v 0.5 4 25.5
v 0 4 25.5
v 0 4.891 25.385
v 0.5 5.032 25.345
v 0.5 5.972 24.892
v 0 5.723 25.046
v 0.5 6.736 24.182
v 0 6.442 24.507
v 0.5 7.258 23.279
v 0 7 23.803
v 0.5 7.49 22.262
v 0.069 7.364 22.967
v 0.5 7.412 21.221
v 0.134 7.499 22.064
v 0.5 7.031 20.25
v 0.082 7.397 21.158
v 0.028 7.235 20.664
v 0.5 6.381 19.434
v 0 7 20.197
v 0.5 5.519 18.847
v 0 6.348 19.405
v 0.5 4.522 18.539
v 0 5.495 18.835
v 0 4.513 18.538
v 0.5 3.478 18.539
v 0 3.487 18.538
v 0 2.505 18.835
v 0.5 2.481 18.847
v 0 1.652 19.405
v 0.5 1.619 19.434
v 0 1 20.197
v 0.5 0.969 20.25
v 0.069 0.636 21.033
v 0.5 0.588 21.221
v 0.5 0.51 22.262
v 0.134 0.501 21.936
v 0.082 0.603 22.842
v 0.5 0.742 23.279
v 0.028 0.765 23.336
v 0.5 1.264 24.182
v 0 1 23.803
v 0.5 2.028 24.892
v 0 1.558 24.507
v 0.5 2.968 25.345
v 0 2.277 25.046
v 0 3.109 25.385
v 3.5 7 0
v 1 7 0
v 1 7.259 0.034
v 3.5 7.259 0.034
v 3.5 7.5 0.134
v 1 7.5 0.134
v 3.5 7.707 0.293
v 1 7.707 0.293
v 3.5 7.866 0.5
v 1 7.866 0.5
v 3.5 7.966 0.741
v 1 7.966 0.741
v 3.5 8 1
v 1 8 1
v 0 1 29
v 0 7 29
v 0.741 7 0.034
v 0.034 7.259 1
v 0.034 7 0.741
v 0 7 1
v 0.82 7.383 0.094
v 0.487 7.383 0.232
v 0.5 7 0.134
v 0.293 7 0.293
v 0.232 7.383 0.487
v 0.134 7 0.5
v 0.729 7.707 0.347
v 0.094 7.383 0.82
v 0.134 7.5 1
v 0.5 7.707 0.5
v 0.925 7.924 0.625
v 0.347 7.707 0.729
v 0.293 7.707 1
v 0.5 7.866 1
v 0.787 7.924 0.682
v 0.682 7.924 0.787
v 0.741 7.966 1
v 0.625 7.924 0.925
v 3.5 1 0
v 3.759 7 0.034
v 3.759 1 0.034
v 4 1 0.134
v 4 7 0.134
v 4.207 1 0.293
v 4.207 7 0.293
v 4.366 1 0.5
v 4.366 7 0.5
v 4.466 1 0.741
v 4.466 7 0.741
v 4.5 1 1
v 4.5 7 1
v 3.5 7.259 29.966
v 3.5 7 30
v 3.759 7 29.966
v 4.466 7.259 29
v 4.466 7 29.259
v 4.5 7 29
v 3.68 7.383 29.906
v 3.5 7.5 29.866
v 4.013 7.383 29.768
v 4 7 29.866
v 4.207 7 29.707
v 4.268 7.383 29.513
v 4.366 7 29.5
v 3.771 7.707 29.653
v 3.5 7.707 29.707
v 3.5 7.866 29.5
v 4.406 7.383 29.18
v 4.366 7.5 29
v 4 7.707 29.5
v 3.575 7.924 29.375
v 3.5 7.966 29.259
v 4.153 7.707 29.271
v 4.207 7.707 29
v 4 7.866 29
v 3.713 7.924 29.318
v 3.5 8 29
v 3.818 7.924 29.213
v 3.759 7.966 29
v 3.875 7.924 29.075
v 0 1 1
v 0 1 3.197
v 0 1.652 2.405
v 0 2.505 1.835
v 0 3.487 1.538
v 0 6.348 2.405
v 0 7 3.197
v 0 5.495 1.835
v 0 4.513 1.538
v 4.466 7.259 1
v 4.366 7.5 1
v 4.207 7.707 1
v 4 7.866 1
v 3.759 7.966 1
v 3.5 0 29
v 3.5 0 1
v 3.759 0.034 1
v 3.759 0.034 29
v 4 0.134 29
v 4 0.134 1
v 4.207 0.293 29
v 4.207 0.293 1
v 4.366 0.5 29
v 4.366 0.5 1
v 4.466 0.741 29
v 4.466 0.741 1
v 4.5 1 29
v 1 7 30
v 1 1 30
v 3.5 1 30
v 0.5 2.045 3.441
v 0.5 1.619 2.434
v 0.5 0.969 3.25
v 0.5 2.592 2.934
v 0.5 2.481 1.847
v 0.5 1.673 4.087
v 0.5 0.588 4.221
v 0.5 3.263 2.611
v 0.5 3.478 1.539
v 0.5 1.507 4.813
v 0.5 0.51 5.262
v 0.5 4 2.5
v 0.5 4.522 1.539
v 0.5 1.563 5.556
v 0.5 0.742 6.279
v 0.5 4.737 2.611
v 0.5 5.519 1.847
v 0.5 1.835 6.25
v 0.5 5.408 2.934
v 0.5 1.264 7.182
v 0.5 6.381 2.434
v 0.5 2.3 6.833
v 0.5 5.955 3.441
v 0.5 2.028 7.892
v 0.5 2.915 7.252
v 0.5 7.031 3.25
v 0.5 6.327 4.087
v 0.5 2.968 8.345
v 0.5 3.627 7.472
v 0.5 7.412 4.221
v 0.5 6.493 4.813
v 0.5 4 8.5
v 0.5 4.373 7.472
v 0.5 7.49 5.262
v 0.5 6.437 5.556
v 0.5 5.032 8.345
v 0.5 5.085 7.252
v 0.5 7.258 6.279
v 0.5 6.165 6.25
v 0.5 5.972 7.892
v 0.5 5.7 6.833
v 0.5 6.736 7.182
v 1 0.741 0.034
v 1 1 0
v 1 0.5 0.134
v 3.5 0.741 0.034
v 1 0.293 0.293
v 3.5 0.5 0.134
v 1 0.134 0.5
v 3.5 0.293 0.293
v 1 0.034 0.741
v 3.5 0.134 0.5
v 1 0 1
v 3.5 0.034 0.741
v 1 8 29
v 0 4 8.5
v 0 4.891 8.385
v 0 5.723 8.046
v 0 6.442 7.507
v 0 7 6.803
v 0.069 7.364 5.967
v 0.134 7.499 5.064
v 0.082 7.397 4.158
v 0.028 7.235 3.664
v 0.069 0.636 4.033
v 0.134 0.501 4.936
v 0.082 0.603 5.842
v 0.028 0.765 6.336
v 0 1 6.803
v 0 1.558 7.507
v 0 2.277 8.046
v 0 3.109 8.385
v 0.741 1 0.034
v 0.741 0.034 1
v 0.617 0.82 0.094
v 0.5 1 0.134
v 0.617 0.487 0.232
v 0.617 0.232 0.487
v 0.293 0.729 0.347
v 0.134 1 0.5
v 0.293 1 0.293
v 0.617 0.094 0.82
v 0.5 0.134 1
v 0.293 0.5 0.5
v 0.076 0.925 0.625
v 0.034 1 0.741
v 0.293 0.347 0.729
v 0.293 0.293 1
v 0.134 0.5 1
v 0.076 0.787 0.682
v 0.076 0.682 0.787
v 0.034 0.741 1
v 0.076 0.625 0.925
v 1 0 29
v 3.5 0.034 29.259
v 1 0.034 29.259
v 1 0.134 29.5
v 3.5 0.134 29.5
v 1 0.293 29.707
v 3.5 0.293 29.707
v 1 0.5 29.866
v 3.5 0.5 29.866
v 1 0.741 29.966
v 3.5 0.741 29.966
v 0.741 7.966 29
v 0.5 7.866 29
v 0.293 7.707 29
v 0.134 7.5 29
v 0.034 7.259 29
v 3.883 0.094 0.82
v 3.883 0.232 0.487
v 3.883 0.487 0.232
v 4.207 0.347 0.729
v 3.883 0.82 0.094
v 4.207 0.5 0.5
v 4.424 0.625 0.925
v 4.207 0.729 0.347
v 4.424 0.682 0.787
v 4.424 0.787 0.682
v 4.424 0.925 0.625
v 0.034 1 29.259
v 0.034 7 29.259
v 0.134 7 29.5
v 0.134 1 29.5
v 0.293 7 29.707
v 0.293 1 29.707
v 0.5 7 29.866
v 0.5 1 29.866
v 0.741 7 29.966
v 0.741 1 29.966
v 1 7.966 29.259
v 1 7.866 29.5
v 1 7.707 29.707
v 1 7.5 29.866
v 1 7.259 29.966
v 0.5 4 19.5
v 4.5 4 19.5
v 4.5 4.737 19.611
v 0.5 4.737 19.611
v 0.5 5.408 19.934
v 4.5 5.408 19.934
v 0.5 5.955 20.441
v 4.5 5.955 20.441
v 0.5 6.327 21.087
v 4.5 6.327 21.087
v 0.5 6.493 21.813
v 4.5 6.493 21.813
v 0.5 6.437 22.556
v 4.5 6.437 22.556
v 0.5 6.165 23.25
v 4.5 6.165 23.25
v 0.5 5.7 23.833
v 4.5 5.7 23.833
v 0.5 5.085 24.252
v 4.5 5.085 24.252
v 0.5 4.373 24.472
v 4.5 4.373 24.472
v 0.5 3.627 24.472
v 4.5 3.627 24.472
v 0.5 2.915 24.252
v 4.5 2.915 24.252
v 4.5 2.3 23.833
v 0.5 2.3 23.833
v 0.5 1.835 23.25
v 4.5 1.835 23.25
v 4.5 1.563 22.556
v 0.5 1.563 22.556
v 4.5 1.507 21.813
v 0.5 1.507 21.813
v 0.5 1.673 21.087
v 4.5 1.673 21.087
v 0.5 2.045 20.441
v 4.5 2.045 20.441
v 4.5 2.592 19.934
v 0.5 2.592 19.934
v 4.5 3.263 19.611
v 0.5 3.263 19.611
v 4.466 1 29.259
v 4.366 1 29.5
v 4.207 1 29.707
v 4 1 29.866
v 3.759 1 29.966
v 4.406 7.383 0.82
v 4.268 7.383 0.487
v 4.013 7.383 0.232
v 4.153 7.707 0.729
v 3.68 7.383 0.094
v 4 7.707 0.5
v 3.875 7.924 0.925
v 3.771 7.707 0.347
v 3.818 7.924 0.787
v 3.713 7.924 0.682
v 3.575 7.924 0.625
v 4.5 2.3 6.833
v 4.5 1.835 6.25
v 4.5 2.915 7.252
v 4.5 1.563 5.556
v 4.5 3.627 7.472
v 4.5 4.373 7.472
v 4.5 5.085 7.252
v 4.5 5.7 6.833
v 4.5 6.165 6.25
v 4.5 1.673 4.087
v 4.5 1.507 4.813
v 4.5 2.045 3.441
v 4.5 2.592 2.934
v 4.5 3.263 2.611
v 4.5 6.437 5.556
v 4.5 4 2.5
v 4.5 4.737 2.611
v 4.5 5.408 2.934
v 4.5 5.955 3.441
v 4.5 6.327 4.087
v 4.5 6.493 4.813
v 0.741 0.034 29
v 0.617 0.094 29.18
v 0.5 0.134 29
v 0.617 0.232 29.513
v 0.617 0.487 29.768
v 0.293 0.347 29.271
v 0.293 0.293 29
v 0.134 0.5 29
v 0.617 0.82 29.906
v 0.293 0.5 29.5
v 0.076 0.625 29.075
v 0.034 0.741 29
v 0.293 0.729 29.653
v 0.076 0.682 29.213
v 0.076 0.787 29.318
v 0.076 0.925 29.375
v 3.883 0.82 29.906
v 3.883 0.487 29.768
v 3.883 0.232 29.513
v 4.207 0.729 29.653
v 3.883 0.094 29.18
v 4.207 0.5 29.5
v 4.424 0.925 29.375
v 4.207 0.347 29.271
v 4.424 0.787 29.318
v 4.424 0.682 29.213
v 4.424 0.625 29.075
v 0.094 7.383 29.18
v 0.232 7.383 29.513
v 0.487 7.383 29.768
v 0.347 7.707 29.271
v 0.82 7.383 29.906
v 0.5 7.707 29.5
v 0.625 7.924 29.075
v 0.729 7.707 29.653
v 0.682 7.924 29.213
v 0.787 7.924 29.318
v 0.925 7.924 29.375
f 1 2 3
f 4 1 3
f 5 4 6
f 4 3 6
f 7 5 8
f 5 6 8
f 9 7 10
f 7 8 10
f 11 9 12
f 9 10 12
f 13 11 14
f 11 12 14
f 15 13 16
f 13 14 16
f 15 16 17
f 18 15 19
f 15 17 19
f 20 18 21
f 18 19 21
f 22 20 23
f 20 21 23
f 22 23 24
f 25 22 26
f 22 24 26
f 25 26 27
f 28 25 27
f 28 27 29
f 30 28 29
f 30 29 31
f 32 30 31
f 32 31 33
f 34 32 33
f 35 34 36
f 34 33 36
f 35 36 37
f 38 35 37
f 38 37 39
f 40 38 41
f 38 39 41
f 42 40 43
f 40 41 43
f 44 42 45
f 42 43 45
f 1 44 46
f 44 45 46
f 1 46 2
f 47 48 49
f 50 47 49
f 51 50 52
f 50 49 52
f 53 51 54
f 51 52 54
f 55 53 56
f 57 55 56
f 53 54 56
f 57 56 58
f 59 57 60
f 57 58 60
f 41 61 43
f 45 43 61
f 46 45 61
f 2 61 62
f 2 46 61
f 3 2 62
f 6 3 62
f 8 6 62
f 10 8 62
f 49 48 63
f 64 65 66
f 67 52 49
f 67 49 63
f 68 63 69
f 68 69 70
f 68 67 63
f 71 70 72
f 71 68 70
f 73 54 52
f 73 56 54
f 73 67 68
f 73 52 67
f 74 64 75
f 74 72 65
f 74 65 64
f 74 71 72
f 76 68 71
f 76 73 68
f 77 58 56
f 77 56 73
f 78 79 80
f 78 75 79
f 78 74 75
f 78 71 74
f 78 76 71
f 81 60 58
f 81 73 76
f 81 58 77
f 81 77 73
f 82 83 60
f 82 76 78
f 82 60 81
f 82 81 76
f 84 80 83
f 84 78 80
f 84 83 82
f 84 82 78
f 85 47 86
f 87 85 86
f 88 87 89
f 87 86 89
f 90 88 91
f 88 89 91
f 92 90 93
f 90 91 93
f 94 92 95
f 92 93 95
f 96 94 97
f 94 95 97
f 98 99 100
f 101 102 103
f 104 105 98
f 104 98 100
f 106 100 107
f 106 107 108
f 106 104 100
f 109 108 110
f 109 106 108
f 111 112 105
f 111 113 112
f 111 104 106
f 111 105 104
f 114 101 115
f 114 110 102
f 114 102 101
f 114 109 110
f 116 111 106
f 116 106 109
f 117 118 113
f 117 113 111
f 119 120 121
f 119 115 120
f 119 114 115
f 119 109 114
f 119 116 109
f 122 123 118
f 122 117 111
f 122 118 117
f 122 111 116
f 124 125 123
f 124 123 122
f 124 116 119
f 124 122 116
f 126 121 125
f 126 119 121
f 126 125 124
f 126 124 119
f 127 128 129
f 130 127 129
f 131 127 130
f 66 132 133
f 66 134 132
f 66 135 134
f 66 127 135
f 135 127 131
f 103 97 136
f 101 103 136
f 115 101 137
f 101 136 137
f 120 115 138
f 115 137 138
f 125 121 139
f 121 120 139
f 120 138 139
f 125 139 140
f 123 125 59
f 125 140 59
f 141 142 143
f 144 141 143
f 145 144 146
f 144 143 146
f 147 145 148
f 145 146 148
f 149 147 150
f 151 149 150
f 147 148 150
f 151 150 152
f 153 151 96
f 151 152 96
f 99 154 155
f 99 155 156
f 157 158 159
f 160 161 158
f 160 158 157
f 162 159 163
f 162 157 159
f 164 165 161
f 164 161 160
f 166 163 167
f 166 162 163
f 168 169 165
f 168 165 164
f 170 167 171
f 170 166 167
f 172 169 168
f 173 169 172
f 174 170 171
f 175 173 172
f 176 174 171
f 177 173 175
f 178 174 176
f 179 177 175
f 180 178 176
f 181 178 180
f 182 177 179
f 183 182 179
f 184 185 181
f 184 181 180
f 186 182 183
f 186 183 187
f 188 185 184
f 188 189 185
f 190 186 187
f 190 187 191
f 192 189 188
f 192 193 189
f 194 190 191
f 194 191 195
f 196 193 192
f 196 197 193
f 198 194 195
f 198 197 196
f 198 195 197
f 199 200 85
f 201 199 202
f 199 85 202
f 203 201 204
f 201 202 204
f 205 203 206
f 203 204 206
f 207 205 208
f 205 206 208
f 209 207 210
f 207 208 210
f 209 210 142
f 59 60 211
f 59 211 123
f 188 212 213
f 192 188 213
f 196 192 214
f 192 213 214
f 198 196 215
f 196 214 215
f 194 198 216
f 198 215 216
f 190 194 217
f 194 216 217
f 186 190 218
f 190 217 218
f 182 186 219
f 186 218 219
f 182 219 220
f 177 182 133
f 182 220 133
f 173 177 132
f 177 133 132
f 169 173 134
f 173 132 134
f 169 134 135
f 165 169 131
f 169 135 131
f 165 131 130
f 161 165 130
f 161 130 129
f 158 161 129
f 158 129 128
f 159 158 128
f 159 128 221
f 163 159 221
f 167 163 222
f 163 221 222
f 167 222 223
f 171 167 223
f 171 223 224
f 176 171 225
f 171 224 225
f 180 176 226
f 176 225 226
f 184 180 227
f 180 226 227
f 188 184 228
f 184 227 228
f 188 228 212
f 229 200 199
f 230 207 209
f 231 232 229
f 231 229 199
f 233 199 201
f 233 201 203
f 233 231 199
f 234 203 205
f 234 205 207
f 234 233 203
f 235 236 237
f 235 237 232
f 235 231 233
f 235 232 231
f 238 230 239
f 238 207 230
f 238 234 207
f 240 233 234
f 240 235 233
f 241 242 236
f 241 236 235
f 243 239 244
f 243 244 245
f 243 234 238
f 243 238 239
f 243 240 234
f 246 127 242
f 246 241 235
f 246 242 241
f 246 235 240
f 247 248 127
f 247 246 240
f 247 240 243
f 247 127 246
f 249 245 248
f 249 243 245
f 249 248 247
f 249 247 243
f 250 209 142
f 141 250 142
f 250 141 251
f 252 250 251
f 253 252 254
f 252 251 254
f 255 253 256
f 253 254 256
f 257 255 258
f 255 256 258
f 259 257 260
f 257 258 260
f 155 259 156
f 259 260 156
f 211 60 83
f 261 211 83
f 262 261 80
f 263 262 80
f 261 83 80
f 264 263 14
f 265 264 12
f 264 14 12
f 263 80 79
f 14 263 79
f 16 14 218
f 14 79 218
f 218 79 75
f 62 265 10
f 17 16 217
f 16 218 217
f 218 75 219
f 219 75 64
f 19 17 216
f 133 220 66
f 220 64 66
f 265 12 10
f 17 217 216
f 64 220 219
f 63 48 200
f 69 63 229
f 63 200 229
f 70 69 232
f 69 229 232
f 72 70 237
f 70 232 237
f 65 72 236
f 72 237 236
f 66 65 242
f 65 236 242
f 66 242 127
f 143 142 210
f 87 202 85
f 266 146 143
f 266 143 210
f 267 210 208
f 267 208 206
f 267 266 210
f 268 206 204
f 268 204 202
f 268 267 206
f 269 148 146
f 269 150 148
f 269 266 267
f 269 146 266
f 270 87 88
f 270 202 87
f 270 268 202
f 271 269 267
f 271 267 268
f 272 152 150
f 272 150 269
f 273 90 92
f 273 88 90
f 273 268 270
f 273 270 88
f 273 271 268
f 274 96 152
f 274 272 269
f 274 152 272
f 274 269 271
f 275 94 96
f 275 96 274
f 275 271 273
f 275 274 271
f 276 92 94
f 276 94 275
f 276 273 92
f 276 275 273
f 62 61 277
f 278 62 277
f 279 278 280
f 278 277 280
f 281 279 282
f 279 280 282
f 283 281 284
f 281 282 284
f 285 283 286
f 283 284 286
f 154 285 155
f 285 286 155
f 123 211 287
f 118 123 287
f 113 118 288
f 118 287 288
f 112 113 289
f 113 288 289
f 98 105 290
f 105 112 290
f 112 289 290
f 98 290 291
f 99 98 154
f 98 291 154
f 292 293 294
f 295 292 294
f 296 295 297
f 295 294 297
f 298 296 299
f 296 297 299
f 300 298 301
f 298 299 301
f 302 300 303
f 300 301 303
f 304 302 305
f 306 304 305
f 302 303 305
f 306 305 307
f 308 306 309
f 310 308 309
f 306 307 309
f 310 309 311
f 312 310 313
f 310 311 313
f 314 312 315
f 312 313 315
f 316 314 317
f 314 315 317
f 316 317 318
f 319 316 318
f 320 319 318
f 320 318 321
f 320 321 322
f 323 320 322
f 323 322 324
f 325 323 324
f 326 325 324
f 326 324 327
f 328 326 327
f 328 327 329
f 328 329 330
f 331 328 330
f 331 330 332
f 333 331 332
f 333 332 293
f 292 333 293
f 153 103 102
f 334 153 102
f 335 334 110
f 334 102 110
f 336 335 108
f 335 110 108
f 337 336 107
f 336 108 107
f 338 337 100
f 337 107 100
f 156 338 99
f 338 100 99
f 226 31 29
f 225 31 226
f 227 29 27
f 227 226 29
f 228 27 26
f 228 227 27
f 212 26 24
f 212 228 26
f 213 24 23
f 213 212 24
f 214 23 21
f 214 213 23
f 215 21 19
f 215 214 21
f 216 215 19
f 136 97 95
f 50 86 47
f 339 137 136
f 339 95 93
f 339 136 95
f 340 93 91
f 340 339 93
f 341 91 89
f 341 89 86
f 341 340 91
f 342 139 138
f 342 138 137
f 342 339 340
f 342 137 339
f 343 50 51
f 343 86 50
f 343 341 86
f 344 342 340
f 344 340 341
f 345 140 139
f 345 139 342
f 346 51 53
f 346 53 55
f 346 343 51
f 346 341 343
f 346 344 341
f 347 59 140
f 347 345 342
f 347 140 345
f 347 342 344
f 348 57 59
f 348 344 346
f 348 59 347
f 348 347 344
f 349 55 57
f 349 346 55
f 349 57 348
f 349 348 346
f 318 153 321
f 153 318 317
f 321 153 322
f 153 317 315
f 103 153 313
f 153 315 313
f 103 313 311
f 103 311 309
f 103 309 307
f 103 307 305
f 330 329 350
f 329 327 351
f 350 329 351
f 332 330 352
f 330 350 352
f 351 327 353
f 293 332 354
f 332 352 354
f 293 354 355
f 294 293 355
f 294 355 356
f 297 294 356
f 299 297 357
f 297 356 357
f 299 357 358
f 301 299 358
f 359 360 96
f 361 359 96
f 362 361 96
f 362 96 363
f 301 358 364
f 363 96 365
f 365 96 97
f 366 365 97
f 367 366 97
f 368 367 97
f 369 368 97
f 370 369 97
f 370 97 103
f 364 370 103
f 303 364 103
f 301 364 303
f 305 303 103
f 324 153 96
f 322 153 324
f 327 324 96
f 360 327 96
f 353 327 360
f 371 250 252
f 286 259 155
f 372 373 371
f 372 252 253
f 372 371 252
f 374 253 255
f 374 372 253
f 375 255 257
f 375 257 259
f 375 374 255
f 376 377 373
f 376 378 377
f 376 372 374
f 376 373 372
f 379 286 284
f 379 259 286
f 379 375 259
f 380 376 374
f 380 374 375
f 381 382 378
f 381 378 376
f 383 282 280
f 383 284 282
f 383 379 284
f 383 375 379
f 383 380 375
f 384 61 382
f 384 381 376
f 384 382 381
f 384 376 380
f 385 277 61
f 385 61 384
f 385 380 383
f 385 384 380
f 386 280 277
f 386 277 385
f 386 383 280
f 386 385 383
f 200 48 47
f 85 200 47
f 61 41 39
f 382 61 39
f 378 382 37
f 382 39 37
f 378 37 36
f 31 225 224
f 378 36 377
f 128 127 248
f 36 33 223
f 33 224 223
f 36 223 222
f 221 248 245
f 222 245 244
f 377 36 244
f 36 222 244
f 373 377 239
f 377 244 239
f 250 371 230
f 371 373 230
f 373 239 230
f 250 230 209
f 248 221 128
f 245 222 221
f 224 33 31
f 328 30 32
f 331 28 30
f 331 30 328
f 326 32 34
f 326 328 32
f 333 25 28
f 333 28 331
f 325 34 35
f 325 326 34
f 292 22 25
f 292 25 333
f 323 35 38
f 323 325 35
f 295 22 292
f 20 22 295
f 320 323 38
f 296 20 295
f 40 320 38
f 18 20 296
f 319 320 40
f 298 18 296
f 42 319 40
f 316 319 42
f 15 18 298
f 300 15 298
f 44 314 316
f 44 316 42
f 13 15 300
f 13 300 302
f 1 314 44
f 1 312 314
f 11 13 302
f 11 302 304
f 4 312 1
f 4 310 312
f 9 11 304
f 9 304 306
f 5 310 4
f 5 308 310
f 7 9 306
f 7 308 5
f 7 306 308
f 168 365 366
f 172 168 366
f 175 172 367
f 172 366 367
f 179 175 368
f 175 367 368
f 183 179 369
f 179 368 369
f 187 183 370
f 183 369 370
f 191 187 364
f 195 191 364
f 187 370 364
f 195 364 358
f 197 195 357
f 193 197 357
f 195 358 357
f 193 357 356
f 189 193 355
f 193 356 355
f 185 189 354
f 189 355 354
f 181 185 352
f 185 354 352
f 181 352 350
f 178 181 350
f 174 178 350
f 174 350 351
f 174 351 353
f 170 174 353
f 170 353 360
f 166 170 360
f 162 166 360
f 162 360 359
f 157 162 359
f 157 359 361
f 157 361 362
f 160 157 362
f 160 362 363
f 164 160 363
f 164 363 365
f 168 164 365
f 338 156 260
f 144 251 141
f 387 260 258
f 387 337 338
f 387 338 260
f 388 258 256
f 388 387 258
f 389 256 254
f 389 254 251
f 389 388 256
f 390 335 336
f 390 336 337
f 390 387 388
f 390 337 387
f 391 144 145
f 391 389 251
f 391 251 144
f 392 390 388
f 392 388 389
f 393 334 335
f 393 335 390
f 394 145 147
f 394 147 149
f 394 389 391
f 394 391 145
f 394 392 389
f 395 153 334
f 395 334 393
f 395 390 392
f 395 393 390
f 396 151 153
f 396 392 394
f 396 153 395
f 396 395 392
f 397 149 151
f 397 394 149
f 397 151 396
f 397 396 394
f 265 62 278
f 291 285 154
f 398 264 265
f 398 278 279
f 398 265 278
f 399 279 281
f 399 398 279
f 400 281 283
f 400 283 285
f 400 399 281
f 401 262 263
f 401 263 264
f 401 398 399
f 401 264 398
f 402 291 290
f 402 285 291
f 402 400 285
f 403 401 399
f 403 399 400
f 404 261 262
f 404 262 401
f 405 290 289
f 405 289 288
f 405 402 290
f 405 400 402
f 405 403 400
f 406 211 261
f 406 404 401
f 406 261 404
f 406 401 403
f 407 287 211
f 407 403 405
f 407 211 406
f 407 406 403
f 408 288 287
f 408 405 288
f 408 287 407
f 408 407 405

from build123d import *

# Parameters (mm, degrees)
SKETCH_1_W          = 4.5
SKETCH_1_H          = 8
EXTRUDE_1_DEPTH     = 30
SKETCH_4_R          = 2.5
CUT_EXTRUDE_2_DEPTH = 32.372758884
SKETCH_7_R          = 3.5
CUT_EXTRUDE_4_DEPTH = 0.5
FILLET_1_R          = 1


with BuildPart() as part:
    # 草图1 → 凸台-拉伸1 (new body)
    with BuildSketch(Plane.XY):
        with Locations((2.25, 4)):
            Rectangle(SKETCH_1_W, SKETCH_1_H)
    extrude(amount=EXTRUDE_1_DEPTH)

    # 草图4 → 切除-拉伸2 (cut, through all)
    with BuildSketch(Plane(origin=(4.5, 0, 0), x_dir=(0, 0, -1), z_dir=(1, 0, 0))):
        with Locations((-5, 4)):
            Circle(SKETCH_4_R)
        with Locations((-22, 4)):
            Circle(SKETCH_4_R)
    extrude(amount=-CUT_EXTRUDE_2_DEPTH, mode=Mode.SUBTRACT)

    # 草图7 → 切除-拉伸4 (cut)
    with BuildSketch(Plane.ZY):
        with Locations((5, 4)):
            Circle(SKETCH_7_R)
        with Locations((22, 4)):
            Circle(SKETCH_7_R)
    extrude(amount=-CUT_EXTRUDE_4_DEPTH, mode=Mode.SUBTRACT)

    # 圆角1
    # the kernel refuses this fillet: 1 mm, written as the material it takes off along each edge
    with BuildSketch(Plane(origin=(3.5, 7, 29), x_dir=(1, 0, 0), z_dir=(0, 1, 0))) as fillet_1_piece_1_section:
        Polygon((0, 0), (FILLET_1_R, 0), (FILLET_1_R, -FILLET_1_R), (0, -FILLET_1_R), align=None)
    fillet_1_piece_1 = extrude(amount=FILLET_1_R, mode=Mode.PRIVATE)
    fillet_1_piece_1 = fillet_1_piece_1 - Plane(origin=(3.5, 7, 29), x_dir=(-0.7071067811865475, 0, -0.7071067811865475), z_dir=(0, 1, 0)) * Sphere(FILLET_1_R, mode=Mode.PRIVATE)
    add(fillet_1_piece_1, mode=Mode.SUBTRACT)
    with BuildSketch(Plane(origin=(3.5, 1, 29), x_dir=(0, 0, 1), z_dir=(1, 0, 0))) as fillet_1_piece_2_section:
        Polygon((0, 0), (FILLET_1_R, 0), (FILLET_1_R, FILLET_1_R), (0, FILLET_1_R), align=None)
    fillet_1_piece_2 = extrude(amount=FILLET_1_R, mode=Mode.PRIVATE)
    fillet_1_piece_2 = fillet_1_piece_2 - Plane(origin=(3.5, 1, 29), x_dir=(0, 0.7071067811865475, -0.7071067811865475), z_dir=(1, 0, 0)) * Sphere(FILLET_1_R, mode=Mode.PRIVATE)
    add(fillet_1_piece_2, mode=Mode.SUBTRACT)
    with BuildSketch(Plane(origin=(1, 7, 29), x_dir=(-1, 0, 0), z_dir=(0, 1, 0))) as fillet_1_piece_3_section:
        Polygon((0, 0), (FILLET_1_R, 0), (FILLET_1_R, FILLET_1_R), (0, FILLET_1_R), align=None)
    fillet_1_piece_3 = extrude(amount=FILLET_1_R, mode=Mode.PRIVATE)
    fillet_1_piece_3 = fillet_1_piece_3 - Plane(origin=(1, 7, 29), x_dir=(0.7071067811865475, 0, -0.7071067811865475), z_dir=(0, 1, 0)) * Sphere(FILLET_1_R, mode=Mode.PRIVATE)
    add(fillet_1_piece_3, mode=Mode.SUBTRACT)
    with BuildSketch(Plane(origin=(1, 1, 29), x_dir=(0, 0, 1), z_dir=(-1, 0, 0))) as fillet_1_piece_4_section:
        Polygon((0, 0), (FILLET_1_R, 0), (FILLET_1_R, -FILLET_1_R), (0, -FILLET_1_R), align=None)
    fillet_1_piece_4 = extrude(amount=FILLET_1_R, mode=Mode.PRIVATE)
    fillet_1_piece_4 = fillet_1_piece_4 - Plane(origin=(1, 1, 29), x_dir=(0, 0.7071067811865475, -0.7071067811865475), z_dir=(-1, 0, 0)) * Sphere(FILLET_1_R, mode=Mode.PRIVATE)
    add(fillet_1_piece_4, mode=Mode.SUBTRACT)
    with BuildSketch(Plane(origin=(1, 7, 1), x_dir=(-1, 0, 0), z_dir=(0, 1, 0))) as fillet_1_piece_5_section:
        Polygon((0, 0), (FILLET_1_R, 0), (FILLET_1_R, -FILLET_1_R), (0, -FILLET_1_R), align=None)
    fillet_1_piece_5 = extrude(amount=FILLET_1_R, mode=Mode.PRIVATE)
    fillet_1_piece_5 = fillet_1_piece_5 - Plane(origin=(1, 7, 1), x_dir=(0.7071067811865475, 0, 0.7071067811865475), z_dir=(0, 1, 0)) * Sphere(FILLET_1_R, mode=Mode.PRIVATE)
    add(fillet_1_piece_5, mode=Mode.SUBTRACT)
    with BuildSketch(Plane(origin=(3.5, 7, 1), x_dir=(1, 0, 0), z_dir=(0, 1, 0))) as fillet_1_piece_6_section:
        Polygon((0, 0), (FILLET_1_R, 0), (FILLET_1_R, FILLET_1_R), (0, FILLET_1_R), align=None)
    fillet_1_piece_6 = extrude(amount=FILLET_1_R, mode=Mode.PRIVATE)
    fillet_1_piece_6 = fillet_1_piece_6 - Plane(origin=(3.5, 7, 1), x_dir=(-0.7071067811865475, 0, 0.7071067811865475), z_dir=(0, 1, 0)) * Sphere(FILLET_1_R, mode=Mode.PRIVATE)
    add(fillet_1_piece_6, mode=Mode.SUBTRACT)
    with BuildSketch(Plane(origin=(3.5, 1, 1), x_dir=(0, 0, -1), z_dir=(1, 0, 0))) as fillet_1_piece_7_section:
        Polygon((0, 0), (FILLET_1_R, 0), (FILLET_1_R, -FILLET_1_R), (0, -FILLET_1_R), align=None)
    fillet_1_piece_7 = extrude(amount=FILLET_1_R, mode=Mode.PRIVATE)
    fillet_1_piece_7 = fillet_1_piece_7 - Plane(origin=(3.5, 1, 1), x_dir=(0, 0.7071067811865475, 0.7071067811865475), z_dir=(1, 0, 0)) * Sphere(FILLET_1_R, mode=Mode.PRIVATE)
    add(fillet_1_piece_7, mode=Mode.SUBTRACT)
    with BuildSketch(Plane(origin=(1, 1, 1), x_dir=(0, 0, -1), z_dir=(-1, 0, 0))) as fillet_1_piece_8_section:
        Polygon((0, 0), (FILLET_1_R, 0), (FILLET_1_R, FILLET_1_R), (0, FILLET_1_R), align=None)
    fillet_1_piece_8 = extrude(amount=FILLET_1_R, mode=Mode.PRIVATE)
    fillet_1_piece_8 = fillet_1_piece_8 - Plane(origin=(1, 1, 1), x_dir=(0, 0.7071067811865475, 0.7071067811865475), z_dir=(-1, 0, 0)) * Sphere(FILLET_1_R, mode=Mode.PRIVATE)
    add(fillet_1_piece_8, mode=Mode.SUBTRACT)
    with BuildSketch(Plane(origin=(4.5, 7, 30), x_dir=(0, 0, -1), z_dir=(0, -1, 0)), Plane(origin=(0, 1, 30), x_dir=(0, 0, -1), z_dir=(0, 1, 0))) as fillet_1_piece_9:
        with BuildLine():
            CenterArc((FILLET_1_R, -FILLET_1_R), FILLET_1_R, 90, 90)
            Line((0, -FILLET_1_R), (0, 0))
            Line((0, 0), (FILLET_1_R, 0))
        make_face()
    extrude(amount=6, mode=Mode.SUBTRACT)
    with BuildSketch(Plane(origin=(1, 8, 30), x_dir=(0, 0, -1), z_dir=(1, 0, 0)), Plane(origin=(3.5, 0, 0), x_dir=(0, 1, 0), z_dir=(-1, 0, 0))) as fillet_1_piece_10:
        with BuildLine():
            CenterArc((FILLET_1_R, -FILLET_1_R), FILLET_1_R, 90, 90)
            Line((0, -FILLET_1_R), (0, 0))
            Line((0, 0), (FILLET_1_R, 0))
        make_face()
    extrude(amount=2.5, mode=Mode.SUBTRACT)
    with BuildSketch(Plane(origin=(1, 8, 0), x_dir=(0, 0, 1), z_dir=(1, 0, 0)), Plane(origin=(3.5, 0, 30), x_dir=(0, 1, 0), z_dir=(-1, 0, 0))) as fillet_1_piece_11:
        with BuildLine():
            CenterArc((FILLET_1_R, FILLET_1_R), FILLET_1_R, 180, 90)
            Line((0, FILLET_1_R), (0, 0))
            Line((0, 0), (FILLET_1_R, 0))
        make_face()
    extrude(amount=2.5, mode=Mode.SUBTRACT)
    with BuildSketch(Plane(origin=(4.5, 7, 0), x_dir=(0, 0, 1), z_dir=(0, -1, 0)), Plane(origin=(0, 1, 0), x_dir=(0, 0, 1), z_dir=(0, 1, 0))) as fillet_1_piece_12:
        with BuildLine():
            CenterArc((FILLET_1_R, FILLET_1_R), FILLET_1_R, 180, 90)
            Line((0, FILLET_1_R), (0, 0))
            Line((0, 0), (FILLET_1_R, 0))
        make_face()
    extrude(amount=6, mode=Mode.SUBTRACT)
    with BuildSketch(Plane(origin=(0, 8, 1), x_dir=(1, 0, 0), z_dir=(0, 0, 1)), Plane(origin=(0, 0, 1), x_dir=(0, 1, 0), z_dir=(0, 0, 1))) as fillet_1_piece_13:
        with BuildLine():
            CenterArc((FILLET_1_R, -FILLET_1_R), FILLET_1_R, 90, 90)
            Line((0, -FILLET_1_R), (0, 0))
            Line((0, 0), (FILLET_1_R, 0))
        make_face()
    extrude(amount=28, mode=Mode.SUBTRACT)
    with BuildSketch(Plane(origin=(4.5, 8, 1), x_dir=(-1, 0, 0), z_dir=(0, 0, 1)), Plane(origin=(4.5, 0, 1), x_dir=(0, 1, 0), z_dir=(0, 0, 1))) as fillet_1_piece_14:
        with BuildLine():
            CenterArc((FILLET_1_R, FILLET_1_R), FILLET_1_R, 180, 90)
            Line((0, FILLET_1_R), (0, 0))
            Line((0, 0), (FILLET_1_R, 0))
        make_face()
    extrude(amount=28, mode=Mode.SUBTRACT)


solid = part.part
